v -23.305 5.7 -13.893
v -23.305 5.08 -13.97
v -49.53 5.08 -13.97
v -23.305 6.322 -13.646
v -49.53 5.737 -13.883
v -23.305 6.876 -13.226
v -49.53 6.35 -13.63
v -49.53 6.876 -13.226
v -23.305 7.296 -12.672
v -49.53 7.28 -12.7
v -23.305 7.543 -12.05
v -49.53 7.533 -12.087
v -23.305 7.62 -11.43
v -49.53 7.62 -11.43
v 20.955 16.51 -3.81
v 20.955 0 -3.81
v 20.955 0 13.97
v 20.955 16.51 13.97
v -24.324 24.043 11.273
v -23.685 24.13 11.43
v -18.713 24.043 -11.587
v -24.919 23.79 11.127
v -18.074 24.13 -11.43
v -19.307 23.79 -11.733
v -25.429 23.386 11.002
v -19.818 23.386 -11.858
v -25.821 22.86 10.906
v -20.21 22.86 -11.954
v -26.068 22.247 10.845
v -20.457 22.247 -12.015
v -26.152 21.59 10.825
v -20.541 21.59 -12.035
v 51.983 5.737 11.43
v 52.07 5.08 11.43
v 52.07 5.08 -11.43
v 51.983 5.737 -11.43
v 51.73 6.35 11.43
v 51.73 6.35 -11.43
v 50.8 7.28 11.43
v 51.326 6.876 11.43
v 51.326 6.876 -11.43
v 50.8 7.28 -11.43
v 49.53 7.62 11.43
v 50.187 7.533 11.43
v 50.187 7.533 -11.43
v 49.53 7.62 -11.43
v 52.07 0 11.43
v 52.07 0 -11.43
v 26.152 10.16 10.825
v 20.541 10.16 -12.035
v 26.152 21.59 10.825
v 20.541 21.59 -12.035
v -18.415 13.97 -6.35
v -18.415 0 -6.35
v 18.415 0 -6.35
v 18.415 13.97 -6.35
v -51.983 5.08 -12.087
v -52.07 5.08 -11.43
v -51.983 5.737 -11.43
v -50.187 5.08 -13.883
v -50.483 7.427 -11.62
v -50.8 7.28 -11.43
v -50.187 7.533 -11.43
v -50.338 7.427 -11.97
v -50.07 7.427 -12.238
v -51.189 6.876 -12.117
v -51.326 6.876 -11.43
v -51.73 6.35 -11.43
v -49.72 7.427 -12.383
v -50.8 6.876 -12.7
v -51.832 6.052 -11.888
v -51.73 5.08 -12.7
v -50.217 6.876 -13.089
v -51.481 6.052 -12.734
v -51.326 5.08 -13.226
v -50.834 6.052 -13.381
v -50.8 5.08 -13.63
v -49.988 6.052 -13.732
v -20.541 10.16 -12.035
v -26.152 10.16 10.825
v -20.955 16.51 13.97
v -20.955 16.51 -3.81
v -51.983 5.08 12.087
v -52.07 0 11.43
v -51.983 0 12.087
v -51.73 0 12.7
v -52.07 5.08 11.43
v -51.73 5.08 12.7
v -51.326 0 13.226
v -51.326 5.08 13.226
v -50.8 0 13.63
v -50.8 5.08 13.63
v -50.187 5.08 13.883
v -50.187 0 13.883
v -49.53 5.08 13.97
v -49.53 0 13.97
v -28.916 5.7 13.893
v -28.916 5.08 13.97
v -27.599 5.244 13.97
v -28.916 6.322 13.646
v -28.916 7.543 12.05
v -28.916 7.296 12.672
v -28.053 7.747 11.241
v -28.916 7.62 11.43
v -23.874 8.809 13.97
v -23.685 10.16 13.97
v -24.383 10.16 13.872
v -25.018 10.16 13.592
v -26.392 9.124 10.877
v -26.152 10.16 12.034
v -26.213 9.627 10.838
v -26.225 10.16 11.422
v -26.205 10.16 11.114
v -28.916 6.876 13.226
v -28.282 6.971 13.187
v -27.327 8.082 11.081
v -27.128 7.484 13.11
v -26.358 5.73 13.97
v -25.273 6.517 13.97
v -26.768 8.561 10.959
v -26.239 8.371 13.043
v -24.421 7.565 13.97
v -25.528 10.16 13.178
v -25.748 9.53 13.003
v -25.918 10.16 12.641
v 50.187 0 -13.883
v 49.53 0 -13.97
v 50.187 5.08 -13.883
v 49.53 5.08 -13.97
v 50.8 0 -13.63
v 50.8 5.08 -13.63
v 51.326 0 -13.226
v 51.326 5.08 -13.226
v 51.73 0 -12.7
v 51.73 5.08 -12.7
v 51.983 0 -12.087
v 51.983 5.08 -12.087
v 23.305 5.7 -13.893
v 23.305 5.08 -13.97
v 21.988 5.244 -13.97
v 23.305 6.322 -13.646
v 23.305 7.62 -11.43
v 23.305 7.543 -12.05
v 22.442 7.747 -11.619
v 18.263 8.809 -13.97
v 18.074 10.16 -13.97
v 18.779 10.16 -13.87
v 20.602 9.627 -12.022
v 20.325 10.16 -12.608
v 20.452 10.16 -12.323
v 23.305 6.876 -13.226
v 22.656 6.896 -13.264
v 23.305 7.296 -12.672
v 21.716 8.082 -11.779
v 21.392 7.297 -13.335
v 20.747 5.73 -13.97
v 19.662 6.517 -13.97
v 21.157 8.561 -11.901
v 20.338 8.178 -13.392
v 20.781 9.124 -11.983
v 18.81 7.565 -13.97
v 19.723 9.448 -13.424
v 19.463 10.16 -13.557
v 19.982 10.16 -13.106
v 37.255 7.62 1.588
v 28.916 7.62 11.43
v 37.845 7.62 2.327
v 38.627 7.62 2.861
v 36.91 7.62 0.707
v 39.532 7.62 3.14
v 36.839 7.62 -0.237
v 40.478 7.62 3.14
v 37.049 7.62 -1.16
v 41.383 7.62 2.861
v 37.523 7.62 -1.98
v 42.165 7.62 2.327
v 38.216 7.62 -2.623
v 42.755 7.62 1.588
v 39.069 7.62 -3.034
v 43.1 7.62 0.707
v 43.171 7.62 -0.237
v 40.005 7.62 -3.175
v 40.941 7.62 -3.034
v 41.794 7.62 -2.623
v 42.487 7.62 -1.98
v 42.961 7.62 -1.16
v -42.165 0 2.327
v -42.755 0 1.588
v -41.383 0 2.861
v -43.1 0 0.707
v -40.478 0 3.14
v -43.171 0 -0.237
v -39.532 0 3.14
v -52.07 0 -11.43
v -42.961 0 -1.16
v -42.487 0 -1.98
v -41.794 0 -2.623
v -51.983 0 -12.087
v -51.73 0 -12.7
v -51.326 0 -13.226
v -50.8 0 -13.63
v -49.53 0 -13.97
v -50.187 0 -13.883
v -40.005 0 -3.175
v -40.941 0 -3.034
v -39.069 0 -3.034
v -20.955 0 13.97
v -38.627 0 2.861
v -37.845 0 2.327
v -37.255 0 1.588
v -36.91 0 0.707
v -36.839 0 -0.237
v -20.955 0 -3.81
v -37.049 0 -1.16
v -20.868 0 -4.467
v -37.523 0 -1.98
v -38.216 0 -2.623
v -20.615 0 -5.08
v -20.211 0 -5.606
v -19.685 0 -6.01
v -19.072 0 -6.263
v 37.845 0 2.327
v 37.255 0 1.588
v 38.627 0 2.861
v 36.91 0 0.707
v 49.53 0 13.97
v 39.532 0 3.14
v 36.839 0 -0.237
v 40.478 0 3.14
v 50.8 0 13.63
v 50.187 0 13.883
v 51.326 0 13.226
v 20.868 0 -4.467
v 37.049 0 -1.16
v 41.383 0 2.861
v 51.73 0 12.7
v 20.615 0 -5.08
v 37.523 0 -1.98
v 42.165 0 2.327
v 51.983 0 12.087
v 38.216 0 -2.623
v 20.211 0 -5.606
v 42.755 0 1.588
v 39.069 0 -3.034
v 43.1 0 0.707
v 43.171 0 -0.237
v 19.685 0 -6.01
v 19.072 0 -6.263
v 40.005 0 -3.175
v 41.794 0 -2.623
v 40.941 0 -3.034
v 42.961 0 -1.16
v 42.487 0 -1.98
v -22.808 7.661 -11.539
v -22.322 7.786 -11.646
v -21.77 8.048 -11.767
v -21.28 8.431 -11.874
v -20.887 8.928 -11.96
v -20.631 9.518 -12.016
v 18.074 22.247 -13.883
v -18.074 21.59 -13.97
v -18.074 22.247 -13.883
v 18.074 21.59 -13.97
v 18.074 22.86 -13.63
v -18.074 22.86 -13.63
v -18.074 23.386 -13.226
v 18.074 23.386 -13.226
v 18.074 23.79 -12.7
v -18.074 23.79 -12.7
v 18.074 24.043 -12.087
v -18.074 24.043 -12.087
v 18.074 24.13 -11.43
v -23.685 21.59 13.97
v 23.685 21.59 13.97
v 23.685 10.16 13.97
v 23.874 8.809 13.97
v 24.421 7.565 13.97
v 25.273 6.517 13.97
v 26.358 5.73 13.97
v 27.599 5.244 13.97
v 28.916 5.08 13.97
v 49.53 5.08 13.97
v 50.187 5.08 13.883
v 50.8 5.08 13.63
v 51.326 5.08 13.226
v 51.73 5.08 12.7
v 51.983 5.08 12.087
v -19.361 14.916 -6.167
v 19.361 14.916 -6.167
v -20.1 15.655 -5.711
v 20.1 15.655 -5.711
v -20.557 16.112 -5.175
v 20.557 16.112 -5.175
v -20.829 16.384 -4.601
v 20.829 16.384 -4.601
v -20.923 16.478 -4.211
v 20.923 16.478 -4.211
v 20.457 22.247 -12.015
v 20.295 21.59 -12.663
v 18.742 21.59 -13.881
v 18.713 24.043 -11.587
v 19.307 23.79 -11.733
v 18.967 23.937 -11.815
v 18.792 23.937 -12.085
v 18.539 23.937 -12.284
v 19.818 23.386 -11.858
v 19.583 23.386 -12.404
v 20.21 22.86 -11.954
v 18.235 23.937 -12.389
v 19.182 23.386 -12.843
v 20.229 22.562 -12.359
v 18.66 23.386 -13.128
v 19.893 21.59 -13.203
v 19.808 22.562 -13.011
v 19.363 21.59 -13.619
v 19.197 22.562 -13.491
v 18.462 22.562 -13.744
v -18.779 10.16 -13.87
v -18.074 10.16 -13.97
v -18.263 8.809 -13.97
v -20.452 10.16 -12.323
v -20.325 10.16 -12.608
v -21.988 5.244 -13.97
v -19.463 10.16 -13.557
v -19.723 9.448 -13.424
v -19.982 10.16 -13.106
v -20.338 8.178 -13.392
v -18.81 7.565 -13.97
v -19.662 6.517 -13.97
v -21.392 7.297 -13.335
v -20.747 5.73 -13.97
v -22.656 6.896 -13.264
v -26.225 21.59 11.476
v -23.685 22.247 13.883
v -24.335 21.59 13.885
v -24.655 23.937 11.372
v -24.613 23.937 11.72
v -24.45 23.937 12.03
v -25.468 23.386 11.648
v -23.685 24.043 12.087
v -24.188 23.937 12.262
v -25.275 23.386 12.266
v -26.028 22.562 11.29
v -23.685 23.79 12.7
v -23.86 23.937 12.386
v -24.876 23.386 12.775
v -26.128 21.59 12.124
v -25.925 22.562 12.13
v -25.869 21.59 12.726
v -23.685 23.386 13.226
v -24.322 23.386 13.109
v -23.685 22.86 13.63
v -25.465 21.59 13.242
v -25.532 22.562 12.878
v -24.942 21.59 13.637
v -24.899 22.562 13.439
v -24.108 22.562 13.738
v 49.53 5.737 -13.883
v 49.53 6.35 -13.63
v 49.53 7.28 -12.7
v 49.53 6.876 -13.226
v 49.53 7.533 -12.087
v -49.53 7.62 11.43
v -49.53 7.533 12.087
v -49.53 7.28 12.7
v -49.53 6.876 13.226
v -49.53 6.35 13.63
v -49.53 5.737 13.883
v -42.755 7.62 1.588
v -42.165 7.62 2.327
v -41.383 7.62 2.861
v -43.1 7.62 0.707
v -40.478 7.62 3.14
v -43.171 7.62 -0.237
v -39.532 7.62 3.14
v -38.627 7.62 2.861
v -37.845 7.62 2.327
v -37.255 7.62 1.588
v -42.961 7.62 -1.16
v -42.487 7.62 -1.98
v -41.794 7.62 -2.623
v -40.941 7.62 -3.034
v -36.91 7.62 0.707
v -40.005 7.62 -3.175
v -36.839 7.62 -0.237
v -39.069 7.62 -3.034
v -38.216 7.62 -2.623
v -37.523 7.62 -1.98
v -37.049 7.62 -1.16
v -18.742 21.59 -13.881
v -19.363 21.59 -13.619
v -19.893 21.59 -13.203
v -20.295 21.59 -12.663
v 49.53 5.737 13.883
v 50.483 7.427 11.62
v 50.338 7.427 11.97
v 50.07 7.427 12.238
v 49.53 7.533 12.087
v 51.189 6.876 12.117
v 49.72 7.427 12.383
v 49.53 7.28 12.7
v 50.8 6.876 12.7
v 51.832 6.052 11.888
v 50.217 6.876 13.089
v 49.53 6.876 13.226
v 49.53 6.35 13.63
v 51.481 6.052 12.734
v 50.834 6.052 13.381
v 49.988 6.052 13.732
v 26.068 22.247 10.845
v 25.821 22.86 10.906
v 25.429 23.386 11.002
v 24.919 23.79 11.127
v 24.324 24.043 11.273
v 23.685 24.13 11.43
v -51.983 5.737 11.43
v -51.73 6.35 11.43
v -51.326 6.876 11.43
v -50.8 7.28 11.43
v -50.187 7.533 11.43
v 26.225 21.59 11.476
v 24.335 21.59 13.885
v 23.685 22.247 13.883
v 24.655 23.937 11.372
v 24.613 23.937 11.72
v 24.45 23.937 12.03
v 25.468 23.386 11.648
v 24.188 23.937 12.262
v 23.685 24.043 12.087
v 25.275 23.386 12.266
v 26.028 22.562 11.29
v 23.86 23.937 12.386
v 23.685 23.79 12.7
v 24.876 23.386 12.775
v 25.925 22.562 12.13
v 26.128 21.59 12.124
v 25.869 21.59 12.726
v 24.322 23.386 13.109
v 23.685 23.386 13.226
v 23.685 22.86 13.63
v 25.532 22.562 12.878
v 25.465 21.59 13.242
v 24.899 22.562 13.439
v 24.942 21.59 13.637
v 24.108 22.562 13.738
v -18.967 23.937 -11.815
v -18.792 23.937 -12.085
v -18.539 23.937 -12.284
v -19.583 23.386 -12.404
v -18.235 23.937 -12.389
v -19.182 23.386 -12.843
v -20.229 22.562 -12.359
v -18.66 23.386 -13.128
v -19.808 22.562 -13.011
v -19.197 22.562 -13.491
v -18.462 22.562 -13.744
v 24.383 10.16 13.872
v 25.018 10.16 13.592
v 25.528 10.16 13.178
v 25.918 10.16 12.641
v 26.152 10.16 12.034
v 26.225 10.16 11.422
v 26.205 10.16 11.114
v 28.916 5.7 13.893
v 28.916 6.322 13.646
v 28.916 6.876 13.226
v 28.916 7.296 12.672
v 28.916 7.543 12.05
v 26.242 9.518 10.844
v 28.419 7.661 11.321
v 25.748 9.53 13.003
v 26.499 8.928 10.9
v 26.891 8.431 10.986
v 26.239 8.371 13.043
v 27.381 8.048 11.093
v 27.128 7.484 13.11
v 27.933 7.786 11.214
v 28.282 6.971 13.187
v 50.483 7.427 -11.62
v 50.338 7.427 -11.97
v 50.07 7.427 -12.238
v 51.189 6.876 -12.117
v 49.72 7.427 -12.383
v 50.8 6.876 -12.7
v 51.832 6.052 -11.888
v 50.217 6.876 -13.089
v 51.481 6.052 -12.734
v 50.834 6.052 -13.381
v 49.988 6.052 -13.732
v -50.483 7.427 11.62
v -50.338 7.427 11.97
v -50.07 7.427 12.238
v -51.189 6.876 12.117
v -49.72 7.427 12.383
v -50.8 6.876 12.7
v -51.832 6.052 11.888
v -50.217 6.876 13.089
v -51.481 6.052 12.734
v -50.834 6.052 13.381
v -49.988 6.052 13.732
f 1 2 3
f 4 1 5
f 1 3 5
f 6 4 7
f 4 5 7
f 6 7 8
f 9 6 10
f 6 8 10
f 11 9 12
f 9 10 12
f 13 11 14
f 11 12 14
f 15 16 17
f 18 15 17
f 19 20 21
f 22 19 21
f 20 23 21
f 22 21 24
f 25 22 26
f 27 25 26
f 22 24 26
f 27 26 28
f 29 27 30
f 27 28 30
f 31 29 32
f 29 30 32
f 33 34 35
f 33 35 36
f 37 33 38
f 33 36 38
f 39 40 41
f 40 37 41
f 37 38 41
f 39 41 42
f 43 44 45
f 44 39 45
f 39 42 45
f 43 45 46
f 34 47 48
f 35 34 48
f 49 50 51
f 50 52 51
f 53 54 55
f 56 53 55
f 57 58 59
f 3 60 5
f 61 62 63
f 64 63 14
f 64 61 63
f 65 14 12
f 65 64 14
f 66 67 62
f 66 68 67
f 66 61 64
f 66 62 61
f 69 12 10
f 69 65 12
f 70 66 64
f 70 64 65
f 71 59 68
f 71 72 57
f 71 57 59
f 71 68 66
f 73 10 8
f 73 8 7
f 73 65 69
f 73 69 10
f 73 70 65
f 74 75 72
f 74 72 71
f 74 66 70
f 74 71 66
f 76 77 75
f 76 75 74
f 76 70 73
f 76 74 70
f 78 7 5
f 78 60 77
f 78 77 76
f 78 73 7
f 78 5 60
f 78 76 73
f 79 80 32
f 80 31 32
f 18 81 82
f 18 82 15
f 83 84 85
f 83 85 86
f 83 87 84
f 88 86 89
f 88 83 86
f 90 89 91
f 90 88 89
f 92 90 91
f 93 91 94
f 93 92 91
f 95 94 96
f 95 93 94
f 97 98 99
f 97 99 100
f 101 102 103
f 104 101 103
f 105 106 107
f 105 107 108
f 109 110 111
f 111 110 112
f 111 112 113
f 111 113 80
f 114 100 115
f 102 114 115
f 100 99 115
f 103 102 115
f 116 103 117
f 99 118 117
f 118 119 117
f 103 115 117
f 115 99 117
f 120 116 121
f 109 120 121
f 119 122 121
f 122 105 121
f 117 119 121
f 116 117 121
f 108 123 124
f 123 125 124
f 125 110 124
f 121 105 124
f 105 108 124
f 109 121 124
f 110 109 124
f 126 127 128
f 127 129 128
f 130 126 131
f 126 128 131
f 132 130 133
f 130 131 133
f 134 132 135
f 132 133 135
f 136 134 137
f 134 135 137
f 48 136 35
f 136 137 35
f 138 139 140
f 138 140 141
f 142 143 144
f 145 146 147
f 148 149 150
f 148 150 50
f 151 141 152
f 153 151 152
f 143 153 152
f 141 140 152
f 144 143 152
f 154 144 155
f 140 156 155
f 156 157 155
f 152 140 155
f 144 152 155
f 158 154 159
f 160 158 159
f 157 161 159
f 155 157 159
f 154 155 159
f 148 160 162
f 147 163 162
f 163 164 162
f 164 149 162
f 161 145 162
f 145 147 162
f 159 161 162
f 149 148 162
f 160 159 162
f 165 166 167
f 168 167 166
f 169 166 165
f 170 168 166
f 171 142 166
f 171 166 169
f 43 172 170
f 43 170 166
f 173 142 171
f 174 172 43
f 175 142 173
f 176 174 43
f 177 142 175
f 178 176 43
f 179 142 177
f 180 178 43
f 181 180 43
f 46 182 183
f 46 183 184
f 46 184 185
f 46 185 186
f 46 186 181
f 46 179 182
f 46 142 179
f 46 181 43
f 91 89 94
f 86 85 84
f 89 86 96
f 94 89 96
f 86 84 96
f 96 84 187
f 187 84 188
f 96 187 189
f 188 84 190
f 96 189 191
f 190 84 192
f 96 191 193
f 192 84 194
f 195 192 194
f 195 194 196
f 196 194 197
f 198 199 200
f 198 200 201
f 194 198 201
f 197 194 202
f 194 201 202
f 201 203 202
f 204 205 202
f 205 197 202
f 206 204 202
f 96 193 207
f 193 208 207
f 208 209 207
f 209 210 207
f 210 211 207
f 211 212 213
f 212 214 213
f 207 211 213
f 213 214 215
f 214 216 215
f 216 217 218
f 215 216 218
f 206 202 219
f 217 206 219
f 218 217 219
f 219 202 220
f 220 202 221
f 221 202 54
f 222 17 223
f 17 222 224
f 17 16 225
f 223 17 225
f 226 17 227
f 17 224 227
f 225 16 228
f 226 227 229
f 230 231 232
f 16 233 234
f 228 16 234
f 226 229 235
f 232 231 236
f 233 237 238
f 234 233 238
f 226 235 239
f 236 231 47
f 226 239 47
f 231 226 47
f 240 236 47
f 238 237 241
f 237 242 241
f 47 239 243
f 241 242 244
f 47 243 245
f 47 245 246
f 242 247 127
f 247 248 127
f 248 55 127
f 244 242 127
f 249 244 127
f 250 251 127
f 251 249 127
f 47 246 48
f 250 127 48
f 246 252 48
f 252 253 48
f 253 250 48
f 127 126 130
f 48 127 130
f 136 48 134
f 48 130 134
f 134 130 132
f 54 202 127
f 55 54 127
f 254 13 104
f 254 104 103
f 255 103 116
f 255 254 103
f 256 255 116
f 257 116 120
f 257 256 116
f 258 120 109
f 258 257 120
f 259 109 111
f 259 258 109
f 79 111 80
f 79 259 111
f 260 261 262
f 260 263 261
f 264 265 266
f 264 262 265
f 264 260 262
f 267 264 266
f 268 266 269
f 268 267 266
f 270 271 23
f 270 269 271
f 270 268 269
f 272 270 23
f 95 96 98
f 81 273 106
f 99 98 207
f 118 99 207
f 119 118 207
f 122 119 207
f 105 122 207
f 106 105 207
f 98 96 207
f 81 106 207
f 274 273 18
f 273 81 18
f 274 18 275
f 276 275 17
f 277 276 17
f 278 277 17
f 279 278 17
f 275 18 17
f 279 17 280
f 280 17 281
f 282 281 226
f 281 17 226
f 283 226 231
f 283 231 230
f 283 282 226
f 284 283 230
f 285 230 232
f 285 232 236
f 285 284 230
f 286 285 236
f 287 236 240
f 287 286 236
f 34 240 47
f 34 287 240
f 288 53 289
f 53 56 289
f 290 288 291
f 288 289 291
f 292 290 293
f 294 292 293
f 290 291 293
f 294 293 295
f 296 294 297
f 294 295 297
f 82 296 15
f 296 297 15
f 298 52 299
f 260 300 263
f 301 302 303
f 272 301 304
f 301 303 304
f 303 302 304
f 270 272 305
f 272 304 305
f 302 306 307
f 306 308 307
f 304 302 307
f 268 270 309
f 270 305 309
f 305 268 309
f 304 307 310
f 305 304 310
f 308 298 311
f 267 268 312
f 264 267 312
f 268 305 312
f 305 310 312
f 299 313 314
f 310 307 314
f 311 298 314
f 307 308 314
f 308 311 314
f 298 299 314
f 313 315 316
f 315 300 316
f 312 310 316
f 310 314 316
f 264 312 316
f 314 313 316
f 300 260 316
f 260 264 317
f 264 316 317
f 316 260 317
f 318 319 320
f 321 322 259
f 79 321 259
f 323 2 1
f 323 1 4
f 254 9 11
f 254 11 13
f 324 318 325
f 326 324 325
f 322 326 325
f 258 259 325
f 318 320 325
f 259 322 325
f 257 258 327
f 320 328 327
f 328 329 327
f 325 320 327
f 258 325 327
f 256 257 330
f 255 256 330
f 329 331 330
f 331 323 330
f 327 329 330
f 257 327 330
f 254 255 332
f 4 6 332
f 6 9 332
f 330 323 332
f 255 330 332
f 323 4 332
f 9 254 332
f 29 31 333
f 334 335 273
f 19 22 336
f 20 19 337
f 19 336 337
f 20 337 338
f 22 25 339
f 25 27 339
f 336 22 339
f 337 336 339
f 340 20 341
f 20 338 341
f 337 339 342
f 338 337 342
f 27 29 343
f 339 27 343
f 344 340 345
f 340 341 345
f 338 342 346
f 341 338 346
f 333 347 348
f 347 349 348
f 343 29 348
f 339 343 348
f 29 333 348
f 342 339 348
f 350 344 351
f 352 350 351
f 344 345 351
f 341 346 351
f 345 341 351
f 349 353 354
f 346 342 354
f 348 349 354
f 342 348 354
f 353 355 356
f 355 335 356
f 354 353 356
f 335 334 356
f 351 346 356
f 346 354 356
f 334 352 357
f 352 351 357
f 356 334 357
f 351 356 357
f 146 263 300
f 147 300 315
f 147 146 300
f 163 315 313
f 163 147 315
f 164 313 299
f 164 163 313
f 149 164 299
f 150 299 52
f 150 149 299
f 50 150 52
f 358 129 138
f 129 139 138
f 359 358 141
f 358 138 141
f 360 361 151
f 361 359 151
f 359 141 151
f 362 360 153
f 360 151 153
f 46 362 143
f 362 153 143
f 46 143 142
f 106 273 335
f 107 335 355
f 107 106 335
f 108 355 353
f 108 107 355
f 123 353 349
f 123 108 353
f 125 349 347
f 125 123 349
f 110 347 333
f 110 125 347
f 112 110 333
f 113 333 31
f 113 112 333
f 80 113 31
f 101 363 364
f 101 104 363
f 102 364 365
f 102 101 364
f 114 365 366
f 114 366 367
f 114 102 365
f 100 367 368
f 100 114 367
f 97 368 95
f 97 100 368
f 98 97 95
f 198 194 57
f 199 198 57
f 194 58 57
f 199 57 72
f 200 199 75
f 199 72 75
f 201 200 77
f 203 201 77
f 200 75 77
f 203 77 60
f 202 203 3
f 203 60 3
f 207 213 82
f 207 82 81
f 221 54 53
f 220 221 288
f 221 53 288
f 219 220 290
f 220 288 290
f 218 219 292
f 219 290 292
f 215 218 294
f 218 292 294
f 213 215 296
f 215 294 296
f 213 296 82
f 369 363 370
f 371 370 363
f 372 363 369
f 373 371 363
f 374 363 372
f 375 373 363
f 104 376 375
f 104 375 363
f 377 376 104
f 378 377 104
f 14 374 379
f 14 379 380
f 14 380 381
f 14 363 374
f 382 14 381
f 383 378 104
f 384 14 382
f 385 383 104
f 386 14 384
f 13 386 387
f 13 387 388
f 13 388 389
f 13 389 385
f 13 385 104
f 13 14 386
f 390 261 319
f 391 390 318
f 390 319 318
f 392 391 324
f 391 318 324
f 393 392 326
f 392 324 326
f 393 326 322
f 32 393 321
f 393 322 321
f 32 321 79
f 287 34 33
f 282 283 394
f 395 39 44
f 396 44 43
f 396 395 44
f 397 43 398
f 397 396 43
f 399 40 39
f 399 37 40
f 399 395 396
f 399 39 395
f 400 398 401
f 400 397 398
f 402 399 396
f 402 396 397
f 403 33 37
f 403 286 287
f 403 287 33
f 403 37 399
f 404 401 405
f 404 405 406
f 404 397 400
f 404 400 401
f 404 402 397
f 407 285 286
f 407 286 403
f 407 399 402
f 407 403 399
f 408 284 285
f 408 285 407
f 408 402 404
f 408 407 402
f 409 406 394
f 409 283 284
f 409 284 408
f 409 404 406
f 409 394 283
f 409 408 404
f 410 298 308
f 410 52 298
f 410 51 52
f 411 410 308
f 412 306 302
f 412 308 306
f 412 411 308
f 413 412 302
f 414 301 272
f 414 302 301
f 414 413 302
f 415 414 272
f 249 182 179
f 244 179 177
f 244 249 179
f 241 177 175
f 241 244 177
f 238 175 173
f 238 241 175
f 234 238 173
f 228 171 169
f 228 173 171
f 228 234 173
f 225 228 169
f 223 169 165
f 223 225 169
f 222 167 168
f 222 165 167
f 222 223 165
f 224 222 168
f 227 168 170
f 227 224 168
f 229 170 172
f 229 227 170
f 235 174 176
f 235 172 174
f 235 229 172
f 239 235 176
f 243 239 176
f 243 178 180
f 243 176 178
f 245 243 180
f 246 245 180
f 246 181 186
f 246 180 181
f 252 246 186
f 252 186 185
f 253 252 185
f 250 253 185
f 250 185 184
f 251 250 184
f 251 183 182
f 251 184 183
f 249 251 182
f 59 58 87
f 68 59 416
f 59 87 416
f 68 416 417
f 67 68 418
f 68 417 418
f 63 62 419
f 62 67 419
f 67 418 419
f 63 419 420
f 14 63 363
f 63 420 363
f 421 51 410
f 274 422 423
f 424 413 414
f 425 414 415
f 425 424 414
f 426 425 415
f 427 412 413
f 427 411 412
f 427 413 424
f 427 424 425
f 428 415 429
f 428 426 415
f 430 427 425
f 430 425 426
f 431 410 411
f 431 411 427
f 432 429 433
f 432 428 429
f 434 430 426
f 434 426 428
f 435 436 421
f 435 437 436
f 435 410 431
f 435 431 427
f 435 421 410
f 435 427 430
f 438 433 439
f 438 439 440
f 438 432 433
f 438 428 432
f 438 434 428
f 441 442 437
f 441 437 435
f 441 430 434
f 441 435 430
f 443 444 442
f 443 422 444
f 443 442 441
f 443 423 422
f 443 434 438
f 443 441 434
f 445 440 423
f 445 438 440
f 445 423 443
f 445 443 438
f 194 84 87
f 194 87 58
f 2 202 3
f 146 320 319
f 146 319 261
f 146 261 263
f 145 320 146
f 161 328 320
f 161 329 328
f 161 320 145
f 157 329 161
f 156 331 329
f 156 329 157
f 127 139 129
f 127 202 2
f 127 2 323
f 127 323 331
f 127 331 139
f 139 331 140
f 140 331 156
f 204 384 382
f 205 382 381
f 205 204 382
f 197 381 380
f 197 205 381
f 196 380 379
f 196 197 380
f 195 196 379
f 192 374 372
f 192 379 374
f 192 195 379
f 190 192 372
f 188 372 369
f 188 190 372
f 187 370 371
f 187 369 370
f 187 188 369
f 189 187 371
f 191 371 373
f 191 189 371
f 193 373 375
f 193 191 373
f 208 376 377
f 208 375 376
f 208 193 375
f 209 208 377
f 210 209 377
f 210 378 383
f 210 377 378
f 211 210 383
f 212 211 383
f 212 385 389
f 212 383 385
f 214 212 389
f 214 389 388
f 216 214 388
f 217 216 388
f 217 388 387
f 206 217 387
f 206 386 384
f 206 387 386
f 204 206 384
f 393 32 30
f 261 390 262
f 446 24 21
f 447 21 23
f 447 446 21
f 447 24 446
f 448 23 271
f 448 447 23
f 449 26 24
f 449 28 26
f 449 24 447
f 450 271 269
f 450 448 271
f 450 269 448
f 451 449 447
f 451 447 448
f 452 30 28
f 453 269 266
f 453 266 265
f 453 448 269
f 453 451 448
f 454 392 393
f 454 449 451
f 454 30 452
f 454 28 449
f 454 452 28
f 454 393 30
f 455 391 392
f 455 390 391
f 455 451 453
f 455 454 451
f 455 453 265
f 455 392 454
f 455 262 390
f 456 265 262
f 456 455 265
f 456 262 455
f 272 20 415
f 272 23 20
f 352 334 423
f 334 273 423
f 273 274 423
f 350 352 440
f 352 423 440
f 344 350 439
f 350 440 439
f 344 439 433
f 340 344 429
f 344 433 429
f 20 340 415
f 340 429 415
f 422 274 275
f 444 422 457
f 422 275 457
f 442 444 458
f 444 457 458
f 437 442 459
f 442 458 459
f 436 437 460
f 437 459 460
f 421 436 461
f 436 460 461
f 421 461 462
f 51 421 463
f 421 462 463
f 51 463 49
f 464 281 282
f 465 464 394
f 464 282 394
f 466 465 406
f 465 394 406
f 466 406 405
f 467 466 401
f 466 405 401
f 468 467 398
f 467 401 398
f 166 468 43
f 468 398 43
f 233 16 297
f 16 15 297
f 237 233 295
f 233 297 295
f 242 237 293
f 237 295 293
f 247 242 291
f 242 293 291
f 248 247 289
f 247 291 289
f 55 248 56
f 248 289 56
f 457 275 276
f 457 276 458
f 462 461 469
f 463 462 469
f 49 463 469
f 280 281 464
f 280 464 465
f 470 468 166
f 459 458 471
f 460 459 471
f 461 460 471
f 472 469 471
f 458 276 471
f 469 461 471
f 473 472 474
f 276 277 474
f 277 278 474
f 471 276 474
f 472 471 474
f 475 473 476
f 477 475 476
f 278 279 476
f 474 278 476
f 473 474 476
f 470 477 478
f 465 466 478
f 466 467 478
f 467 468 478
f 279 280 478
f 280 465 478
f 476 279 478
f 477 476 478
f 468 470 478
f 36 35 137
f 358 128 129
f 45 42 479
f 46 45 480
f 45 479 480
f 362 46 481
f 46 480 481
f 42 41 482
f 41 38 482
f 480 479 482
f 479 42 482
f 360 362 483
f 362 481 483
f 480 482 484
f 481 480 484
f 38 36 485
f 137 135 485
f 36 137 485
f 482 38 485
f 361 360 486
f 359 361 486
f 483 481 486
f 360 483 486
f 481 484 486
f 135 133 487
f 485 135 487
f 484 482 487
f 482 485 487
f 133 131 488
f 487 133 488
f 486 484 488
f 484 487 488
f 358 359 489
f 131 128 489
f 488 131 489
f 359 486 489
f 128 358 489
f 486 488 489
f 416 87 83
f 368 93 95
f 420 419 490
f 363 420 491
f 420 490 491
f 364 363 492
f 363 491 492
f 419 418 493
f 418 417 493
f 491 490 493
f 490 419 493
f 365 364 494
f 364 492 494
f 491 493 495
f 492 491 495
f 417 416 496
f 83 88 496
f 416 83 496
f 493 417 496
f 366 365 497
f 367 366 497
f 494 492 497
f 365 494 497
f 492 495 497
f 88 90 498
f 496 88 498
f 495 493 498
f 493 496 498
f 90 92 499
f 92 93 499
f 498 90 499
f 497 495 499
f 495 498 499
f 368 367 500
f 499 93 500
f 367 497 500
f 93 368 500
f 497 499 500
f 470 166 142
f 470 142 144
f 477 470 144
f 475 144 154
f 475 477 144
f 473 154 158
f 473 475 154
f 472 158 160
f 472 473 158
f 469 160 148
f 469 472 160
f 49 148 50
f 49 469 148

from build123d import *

# Parameters (mm, degrees)
SKETCH1_W           = 104.14
SKETCH1_H           = 27.94
SKETCH1_R           = 3.175
BOSS_EXTRUDE1_DEPTH = 24.13
SKETCH2_W           = 41.91
SKETCH2_H           = 20.32
CUT_EXTRUDE1_DEPTH  = 16.51
CUT_EXTRUDE2_DEPTH  = 16.51
FILLET1_R           = 2.54


with BuildPart() as part:
    # Sketch1 → Boss-Extrude1 (new body)
    with BuildSketch(Plane(origin=(0, 0, 0), x_dir=(1, 0, 0), z_dir=(0, 1, 0))):
        Rectangle(SKETCH1_W, SKETCH1_H)
        with Locations(Location((40.005, 0, 0), (0, 0, 90))):
            Circle(SKETCH1_R, mode=Mode.SUBTRACT)
        with Locations(Location((-40.005, 0, 0), (0, 0, 90))):
            Circle(SKETCH1_R, mode=Mode.SUBTRACT)
    extrude(amount=BOSS_EXTRUDE1_DEPTH)

    # Sketch2 → Cut-Extrude1 (cut)
    with BuildSketch(Plane.XZ):
        with Locations((0, 3.81)):
            Rectangle(SKETCH2_W, SKETCH2_H)
    extrude(amount=-CUT_EXTRUDE1_DEPTH, mode=Mode.SUBTRACT)

    # Sketch4 → Cut-Extrude2 (cut)
    with BuildSketch(Plane(origin=(0, 24.13, 0), x_dir=(1, 0, 0), z_dir=(0, 1, 0))):
        Polygon((-52.07, -13.97), (-26.924, -13.97), (-20.066, 13.97), (-52.07, 13.97), align=None)
        Polygon((52.07, 13.97), (20.066, 13.97), (26.924, -13.97), (52.07, -13.97), align=None)
    extrude(amount=-CUT_EXTRUDE2_DEPTH, mode=Mode.SUBTRACT)

    # Fillet1
    fillet1_edges = [part.edges().sort_by_distance(p)[0] for p in [
        (-20.955, 8.255, -6.35),
        (0, 16.51, -6.35),
        (20.955, 8.255, -6.35),
        (52.07, 3.81, 13.97),
        (0, 24.13, 13.97),
        (-52.07, 3.81, 13.97),
        (-52.07, 3.81, -13.97),
        (0, 24.13, -13.97),
        (52.07, 3.81, -13.97),
        (-52.07, 7.62, 0),
        (-36.068, 7.62, -13.97),
        (-23.495, 7.62, 0),
        (-20.066, 15.875, -13.97),
        (-39.497, 7.62, 13.97),
        (-26.924, 15.875, 13.97),
        (-23.495, 24.13, 0),
        (52.07, 7.62, 0),
        (39.497, 7.62, 13.97),
        (23.495, 7.62, 0),
        (26.924, 15.875, 13.97),
        (36.068, 7.62, -13.97),
        (20.066, 15.875, -13.97),
        (23.495, 24.13, 0),
    ]]
    fillet(fillet1_edges, radius=FILLET1_R)


solid = part.part
